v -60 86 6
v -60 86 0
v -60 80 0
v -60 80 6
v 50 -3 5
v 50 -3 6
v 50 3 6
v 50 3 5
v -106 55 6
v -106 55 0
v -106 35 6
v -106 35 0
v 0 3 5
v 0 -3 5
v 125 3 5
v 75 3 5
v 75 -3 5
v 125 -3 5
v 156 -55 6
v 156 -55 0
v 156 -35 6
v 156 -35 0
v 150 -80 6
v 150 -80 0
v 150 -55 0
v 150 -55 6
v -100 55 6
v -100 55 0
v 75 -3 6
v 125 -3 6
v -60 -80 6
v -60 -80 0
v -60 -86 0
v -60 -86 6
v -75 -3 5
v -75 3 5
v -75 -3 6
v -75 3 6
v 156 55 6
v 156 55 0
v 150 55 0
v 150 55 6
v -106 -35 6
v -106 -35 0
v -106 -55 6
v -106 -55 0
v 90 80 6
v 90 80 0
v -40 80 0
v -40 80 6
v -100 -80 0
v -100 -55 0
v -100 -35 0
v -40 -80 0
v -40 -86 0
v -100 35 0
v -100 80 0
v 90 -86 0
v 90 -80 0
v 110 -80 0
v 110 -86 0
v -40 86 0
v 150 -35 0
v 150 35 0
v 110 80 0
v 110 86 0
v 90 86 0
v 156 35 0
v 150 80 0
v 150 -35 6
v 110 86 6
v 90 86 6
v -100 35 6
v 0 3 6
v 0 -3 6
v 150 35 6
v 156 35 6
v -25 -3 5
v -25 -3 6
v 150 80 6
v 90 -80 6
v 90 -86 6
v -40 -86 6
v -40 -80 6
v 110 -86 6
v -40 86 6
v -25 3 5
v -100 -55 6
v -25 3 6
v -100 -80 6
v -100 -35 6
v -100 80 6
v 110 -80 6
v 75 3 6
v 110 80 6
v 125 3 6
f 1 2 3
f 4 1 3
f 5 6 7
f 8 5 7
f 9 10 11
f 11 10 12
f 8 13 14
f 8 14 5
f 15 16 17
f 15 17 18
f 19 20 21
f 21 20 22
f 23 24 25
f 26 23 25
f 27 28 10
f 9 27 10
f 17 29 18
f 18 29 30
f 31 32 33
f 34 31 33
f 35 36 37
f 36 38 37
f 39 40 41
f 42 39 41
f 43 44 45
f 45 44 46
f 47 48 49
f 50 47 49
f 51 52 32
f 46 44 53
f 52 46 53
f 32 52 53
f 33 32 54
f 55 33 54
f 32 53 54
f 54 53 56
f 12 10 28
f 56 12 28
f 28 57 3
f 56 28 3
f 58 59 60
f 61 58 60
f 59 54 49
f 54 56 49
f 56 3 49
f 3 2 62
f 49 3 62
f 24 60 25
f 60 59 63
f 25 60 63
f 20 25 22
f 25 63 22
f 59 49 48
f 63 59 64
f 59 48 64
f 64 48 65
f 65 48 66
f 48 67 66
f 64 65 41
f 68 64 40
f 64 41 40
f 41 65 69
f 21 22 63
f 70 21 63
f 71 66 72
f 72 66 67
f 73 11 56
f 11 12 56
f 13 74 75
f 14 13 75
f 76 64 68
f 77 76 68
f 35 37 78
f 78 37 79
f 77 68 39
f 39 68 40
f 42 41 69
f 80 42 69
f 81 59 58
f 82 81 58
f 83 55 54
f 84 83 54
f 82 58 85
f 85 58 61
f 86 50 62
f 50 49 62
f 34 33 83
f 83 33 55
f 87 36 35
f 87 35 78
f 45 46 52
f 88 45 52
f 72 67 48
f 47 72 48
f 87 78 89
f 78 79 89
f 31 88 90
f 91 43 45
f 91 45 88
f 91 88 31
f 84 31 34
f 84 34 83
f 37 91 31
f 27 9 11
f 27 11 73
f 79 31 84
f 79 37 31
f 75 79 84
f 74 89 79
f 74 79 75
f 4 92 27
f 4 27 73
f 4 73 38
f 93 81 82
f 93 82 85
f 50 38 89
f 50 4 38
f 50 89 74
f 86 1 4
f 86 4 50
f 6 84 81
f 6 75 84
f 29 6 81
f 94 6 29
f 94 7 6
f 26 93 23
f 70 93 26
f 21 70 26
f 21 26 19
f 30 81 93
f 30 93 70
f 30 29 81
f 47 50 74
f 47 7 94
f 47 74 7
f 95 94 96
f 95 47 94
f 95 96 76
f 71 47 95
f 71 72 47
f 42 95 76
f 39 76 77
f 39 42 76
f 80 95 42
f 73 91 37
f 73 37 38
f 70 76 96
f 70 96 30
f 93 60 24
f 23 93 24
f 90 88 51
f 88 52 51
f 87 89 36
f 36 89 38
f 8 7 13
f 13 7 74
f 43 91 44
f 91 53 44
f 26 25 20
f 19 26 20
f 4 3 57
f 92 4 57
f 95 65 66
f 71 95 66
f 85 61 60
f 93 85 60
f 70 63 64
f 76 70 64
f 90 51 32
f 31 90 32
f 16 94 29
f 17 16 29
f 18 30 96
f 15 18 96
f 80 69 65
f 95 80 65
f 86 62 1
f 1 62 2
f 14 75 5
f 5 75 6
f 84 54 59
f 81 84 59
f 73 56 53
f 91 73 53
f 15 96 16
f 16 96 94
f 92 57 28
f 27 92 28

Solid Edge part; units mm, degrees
sketch "Sketch1" plane through (0, 0, 0) normal (0, 0, 1) x (1, 0, 0)
  line L0 (-40, -80) -> (90, -80)
  line L1 (90, -80) -> (90, -86)
  line L2 (90, -86) -> (110, -86)
  line L3 (110, -86) -> (110, -80)
  line L4 (110, -80) -> (150, -80)
  line L5 (150, -80) -> (150, -55)
  line L6 (150, -55) -> (156, -55)
  line L7 (156, -55) -> (156, -35)
  line L8 (156, -35) -> (150, -35)
  line L9 (150, -35) -> (150, 35)
  line L10 (150, 35) -> (156, 35)
  line L11 (156, 35) -> (156, 55)
  line L12 (156, 55) -> (150, 55)
  line L13 (150, 55) -> (150, 80)
  line L14 (150, 80) -> (110, 80)
  line L15 (110, 80) -> (110, 86)
  line L16 (110, 86) -> (90, 86)
  line L17 (90, 86) -> (90, 80)
  line L18 (90, 80) -> (-40, 80)
  line L19 (-40, 80) -> (-40, 86)
  line L20 (-40, 86) -> (-60, 86)
  line L21 (-60, 86) -> (-60, 80)
  line L22 (-60, 80) -> (-100, 80)
  line L23 (-100, 80) -> (-100, 55)
  line L24 (-100, 55) -> (-106, 55)
  line L25 (-106, 55) -> (-106, 35)
  line L26 (-106, 35) -> (-100, 35)
  line L27 (-100, 35) -> (-100, -35)
  line L28 (-100, -35) -> (-106, -35)
  line L29 (-106, -35) -> (-106, -55)
  line L30 (-106, -55) -> (-100, -55)
  line L31 (-100, -55) -> (-100, -80)
  line L32 (-100, -80) -> (-60, -80)
  line L33 (-60, -80) -> (-60, -86)
  line L34 (-60, -86) -> (-40, -86)
  line L35 (-40, -86) -> (-40, -80)
  dimension "D1" = 40
  dimension "D2" = 20
  dimension "D3" = 20
  dimension "D4" = 20
  dimension "D5" = 20
  dimension "D6" = 20
  dimension "D7" = 20
  dimension "D8" = 20
  dimension "D9" = 20
  dimension "D10" = 40
  dimension "D11" = 40
  dimension "D12" = 40
  dimension "D13" = 25
  dimension "D14" = 25
  dimension "D15" = 25
  dimension "D16" = 25
  dimension "D17" = 6
  dimension "D18" = 6
  dimension "D19" = 6
  dimension "D20" = 6
  dimension "D21" = 250
extrude "Protrusion1" add sketch "Sketch1" along normal blind 6
sketch "Sketch2" plane through (25, 0, 6) normal (0, 0, 1) x (1, 0, 0)
  line L0 (-100, -3) -> (-50, -3)
  line L1 (-50, -3) -> (-50, 3)
  line L2 (-50, 3) -> (-100, 3)
  line L3 (-100, 3) -> (-100, -3)
  line L4 (50, -3) -> (100, -3)
  line L5 (100, -3) -> (100, 3)
  line L6 (100, 3) -> (50, 3)
  line L7 (50, 3) -> (50, -3)
  line L8 (-25, -3) -> (25, -3)
  line L9 (25, -3) -> (25, 3)
  line L10 (25, 3) -> (-25, 3)
  line L11 (-25, 3) -> (-25, -3)
  dimension "D1" = 50
  dimension "D2" = 6
  dimension "D3" = 50
  dimension "D4" = 6
  dimension "D5" = 50
  dimension "D6" = 6
  dimension "D7" = 25
  dimension "D8" = 25
  dimension "D9" = 25
  dimension "D10" = 25
extrude "ExtrudedCutout_1" cut sketch "Sketch2" against normal blind 1
